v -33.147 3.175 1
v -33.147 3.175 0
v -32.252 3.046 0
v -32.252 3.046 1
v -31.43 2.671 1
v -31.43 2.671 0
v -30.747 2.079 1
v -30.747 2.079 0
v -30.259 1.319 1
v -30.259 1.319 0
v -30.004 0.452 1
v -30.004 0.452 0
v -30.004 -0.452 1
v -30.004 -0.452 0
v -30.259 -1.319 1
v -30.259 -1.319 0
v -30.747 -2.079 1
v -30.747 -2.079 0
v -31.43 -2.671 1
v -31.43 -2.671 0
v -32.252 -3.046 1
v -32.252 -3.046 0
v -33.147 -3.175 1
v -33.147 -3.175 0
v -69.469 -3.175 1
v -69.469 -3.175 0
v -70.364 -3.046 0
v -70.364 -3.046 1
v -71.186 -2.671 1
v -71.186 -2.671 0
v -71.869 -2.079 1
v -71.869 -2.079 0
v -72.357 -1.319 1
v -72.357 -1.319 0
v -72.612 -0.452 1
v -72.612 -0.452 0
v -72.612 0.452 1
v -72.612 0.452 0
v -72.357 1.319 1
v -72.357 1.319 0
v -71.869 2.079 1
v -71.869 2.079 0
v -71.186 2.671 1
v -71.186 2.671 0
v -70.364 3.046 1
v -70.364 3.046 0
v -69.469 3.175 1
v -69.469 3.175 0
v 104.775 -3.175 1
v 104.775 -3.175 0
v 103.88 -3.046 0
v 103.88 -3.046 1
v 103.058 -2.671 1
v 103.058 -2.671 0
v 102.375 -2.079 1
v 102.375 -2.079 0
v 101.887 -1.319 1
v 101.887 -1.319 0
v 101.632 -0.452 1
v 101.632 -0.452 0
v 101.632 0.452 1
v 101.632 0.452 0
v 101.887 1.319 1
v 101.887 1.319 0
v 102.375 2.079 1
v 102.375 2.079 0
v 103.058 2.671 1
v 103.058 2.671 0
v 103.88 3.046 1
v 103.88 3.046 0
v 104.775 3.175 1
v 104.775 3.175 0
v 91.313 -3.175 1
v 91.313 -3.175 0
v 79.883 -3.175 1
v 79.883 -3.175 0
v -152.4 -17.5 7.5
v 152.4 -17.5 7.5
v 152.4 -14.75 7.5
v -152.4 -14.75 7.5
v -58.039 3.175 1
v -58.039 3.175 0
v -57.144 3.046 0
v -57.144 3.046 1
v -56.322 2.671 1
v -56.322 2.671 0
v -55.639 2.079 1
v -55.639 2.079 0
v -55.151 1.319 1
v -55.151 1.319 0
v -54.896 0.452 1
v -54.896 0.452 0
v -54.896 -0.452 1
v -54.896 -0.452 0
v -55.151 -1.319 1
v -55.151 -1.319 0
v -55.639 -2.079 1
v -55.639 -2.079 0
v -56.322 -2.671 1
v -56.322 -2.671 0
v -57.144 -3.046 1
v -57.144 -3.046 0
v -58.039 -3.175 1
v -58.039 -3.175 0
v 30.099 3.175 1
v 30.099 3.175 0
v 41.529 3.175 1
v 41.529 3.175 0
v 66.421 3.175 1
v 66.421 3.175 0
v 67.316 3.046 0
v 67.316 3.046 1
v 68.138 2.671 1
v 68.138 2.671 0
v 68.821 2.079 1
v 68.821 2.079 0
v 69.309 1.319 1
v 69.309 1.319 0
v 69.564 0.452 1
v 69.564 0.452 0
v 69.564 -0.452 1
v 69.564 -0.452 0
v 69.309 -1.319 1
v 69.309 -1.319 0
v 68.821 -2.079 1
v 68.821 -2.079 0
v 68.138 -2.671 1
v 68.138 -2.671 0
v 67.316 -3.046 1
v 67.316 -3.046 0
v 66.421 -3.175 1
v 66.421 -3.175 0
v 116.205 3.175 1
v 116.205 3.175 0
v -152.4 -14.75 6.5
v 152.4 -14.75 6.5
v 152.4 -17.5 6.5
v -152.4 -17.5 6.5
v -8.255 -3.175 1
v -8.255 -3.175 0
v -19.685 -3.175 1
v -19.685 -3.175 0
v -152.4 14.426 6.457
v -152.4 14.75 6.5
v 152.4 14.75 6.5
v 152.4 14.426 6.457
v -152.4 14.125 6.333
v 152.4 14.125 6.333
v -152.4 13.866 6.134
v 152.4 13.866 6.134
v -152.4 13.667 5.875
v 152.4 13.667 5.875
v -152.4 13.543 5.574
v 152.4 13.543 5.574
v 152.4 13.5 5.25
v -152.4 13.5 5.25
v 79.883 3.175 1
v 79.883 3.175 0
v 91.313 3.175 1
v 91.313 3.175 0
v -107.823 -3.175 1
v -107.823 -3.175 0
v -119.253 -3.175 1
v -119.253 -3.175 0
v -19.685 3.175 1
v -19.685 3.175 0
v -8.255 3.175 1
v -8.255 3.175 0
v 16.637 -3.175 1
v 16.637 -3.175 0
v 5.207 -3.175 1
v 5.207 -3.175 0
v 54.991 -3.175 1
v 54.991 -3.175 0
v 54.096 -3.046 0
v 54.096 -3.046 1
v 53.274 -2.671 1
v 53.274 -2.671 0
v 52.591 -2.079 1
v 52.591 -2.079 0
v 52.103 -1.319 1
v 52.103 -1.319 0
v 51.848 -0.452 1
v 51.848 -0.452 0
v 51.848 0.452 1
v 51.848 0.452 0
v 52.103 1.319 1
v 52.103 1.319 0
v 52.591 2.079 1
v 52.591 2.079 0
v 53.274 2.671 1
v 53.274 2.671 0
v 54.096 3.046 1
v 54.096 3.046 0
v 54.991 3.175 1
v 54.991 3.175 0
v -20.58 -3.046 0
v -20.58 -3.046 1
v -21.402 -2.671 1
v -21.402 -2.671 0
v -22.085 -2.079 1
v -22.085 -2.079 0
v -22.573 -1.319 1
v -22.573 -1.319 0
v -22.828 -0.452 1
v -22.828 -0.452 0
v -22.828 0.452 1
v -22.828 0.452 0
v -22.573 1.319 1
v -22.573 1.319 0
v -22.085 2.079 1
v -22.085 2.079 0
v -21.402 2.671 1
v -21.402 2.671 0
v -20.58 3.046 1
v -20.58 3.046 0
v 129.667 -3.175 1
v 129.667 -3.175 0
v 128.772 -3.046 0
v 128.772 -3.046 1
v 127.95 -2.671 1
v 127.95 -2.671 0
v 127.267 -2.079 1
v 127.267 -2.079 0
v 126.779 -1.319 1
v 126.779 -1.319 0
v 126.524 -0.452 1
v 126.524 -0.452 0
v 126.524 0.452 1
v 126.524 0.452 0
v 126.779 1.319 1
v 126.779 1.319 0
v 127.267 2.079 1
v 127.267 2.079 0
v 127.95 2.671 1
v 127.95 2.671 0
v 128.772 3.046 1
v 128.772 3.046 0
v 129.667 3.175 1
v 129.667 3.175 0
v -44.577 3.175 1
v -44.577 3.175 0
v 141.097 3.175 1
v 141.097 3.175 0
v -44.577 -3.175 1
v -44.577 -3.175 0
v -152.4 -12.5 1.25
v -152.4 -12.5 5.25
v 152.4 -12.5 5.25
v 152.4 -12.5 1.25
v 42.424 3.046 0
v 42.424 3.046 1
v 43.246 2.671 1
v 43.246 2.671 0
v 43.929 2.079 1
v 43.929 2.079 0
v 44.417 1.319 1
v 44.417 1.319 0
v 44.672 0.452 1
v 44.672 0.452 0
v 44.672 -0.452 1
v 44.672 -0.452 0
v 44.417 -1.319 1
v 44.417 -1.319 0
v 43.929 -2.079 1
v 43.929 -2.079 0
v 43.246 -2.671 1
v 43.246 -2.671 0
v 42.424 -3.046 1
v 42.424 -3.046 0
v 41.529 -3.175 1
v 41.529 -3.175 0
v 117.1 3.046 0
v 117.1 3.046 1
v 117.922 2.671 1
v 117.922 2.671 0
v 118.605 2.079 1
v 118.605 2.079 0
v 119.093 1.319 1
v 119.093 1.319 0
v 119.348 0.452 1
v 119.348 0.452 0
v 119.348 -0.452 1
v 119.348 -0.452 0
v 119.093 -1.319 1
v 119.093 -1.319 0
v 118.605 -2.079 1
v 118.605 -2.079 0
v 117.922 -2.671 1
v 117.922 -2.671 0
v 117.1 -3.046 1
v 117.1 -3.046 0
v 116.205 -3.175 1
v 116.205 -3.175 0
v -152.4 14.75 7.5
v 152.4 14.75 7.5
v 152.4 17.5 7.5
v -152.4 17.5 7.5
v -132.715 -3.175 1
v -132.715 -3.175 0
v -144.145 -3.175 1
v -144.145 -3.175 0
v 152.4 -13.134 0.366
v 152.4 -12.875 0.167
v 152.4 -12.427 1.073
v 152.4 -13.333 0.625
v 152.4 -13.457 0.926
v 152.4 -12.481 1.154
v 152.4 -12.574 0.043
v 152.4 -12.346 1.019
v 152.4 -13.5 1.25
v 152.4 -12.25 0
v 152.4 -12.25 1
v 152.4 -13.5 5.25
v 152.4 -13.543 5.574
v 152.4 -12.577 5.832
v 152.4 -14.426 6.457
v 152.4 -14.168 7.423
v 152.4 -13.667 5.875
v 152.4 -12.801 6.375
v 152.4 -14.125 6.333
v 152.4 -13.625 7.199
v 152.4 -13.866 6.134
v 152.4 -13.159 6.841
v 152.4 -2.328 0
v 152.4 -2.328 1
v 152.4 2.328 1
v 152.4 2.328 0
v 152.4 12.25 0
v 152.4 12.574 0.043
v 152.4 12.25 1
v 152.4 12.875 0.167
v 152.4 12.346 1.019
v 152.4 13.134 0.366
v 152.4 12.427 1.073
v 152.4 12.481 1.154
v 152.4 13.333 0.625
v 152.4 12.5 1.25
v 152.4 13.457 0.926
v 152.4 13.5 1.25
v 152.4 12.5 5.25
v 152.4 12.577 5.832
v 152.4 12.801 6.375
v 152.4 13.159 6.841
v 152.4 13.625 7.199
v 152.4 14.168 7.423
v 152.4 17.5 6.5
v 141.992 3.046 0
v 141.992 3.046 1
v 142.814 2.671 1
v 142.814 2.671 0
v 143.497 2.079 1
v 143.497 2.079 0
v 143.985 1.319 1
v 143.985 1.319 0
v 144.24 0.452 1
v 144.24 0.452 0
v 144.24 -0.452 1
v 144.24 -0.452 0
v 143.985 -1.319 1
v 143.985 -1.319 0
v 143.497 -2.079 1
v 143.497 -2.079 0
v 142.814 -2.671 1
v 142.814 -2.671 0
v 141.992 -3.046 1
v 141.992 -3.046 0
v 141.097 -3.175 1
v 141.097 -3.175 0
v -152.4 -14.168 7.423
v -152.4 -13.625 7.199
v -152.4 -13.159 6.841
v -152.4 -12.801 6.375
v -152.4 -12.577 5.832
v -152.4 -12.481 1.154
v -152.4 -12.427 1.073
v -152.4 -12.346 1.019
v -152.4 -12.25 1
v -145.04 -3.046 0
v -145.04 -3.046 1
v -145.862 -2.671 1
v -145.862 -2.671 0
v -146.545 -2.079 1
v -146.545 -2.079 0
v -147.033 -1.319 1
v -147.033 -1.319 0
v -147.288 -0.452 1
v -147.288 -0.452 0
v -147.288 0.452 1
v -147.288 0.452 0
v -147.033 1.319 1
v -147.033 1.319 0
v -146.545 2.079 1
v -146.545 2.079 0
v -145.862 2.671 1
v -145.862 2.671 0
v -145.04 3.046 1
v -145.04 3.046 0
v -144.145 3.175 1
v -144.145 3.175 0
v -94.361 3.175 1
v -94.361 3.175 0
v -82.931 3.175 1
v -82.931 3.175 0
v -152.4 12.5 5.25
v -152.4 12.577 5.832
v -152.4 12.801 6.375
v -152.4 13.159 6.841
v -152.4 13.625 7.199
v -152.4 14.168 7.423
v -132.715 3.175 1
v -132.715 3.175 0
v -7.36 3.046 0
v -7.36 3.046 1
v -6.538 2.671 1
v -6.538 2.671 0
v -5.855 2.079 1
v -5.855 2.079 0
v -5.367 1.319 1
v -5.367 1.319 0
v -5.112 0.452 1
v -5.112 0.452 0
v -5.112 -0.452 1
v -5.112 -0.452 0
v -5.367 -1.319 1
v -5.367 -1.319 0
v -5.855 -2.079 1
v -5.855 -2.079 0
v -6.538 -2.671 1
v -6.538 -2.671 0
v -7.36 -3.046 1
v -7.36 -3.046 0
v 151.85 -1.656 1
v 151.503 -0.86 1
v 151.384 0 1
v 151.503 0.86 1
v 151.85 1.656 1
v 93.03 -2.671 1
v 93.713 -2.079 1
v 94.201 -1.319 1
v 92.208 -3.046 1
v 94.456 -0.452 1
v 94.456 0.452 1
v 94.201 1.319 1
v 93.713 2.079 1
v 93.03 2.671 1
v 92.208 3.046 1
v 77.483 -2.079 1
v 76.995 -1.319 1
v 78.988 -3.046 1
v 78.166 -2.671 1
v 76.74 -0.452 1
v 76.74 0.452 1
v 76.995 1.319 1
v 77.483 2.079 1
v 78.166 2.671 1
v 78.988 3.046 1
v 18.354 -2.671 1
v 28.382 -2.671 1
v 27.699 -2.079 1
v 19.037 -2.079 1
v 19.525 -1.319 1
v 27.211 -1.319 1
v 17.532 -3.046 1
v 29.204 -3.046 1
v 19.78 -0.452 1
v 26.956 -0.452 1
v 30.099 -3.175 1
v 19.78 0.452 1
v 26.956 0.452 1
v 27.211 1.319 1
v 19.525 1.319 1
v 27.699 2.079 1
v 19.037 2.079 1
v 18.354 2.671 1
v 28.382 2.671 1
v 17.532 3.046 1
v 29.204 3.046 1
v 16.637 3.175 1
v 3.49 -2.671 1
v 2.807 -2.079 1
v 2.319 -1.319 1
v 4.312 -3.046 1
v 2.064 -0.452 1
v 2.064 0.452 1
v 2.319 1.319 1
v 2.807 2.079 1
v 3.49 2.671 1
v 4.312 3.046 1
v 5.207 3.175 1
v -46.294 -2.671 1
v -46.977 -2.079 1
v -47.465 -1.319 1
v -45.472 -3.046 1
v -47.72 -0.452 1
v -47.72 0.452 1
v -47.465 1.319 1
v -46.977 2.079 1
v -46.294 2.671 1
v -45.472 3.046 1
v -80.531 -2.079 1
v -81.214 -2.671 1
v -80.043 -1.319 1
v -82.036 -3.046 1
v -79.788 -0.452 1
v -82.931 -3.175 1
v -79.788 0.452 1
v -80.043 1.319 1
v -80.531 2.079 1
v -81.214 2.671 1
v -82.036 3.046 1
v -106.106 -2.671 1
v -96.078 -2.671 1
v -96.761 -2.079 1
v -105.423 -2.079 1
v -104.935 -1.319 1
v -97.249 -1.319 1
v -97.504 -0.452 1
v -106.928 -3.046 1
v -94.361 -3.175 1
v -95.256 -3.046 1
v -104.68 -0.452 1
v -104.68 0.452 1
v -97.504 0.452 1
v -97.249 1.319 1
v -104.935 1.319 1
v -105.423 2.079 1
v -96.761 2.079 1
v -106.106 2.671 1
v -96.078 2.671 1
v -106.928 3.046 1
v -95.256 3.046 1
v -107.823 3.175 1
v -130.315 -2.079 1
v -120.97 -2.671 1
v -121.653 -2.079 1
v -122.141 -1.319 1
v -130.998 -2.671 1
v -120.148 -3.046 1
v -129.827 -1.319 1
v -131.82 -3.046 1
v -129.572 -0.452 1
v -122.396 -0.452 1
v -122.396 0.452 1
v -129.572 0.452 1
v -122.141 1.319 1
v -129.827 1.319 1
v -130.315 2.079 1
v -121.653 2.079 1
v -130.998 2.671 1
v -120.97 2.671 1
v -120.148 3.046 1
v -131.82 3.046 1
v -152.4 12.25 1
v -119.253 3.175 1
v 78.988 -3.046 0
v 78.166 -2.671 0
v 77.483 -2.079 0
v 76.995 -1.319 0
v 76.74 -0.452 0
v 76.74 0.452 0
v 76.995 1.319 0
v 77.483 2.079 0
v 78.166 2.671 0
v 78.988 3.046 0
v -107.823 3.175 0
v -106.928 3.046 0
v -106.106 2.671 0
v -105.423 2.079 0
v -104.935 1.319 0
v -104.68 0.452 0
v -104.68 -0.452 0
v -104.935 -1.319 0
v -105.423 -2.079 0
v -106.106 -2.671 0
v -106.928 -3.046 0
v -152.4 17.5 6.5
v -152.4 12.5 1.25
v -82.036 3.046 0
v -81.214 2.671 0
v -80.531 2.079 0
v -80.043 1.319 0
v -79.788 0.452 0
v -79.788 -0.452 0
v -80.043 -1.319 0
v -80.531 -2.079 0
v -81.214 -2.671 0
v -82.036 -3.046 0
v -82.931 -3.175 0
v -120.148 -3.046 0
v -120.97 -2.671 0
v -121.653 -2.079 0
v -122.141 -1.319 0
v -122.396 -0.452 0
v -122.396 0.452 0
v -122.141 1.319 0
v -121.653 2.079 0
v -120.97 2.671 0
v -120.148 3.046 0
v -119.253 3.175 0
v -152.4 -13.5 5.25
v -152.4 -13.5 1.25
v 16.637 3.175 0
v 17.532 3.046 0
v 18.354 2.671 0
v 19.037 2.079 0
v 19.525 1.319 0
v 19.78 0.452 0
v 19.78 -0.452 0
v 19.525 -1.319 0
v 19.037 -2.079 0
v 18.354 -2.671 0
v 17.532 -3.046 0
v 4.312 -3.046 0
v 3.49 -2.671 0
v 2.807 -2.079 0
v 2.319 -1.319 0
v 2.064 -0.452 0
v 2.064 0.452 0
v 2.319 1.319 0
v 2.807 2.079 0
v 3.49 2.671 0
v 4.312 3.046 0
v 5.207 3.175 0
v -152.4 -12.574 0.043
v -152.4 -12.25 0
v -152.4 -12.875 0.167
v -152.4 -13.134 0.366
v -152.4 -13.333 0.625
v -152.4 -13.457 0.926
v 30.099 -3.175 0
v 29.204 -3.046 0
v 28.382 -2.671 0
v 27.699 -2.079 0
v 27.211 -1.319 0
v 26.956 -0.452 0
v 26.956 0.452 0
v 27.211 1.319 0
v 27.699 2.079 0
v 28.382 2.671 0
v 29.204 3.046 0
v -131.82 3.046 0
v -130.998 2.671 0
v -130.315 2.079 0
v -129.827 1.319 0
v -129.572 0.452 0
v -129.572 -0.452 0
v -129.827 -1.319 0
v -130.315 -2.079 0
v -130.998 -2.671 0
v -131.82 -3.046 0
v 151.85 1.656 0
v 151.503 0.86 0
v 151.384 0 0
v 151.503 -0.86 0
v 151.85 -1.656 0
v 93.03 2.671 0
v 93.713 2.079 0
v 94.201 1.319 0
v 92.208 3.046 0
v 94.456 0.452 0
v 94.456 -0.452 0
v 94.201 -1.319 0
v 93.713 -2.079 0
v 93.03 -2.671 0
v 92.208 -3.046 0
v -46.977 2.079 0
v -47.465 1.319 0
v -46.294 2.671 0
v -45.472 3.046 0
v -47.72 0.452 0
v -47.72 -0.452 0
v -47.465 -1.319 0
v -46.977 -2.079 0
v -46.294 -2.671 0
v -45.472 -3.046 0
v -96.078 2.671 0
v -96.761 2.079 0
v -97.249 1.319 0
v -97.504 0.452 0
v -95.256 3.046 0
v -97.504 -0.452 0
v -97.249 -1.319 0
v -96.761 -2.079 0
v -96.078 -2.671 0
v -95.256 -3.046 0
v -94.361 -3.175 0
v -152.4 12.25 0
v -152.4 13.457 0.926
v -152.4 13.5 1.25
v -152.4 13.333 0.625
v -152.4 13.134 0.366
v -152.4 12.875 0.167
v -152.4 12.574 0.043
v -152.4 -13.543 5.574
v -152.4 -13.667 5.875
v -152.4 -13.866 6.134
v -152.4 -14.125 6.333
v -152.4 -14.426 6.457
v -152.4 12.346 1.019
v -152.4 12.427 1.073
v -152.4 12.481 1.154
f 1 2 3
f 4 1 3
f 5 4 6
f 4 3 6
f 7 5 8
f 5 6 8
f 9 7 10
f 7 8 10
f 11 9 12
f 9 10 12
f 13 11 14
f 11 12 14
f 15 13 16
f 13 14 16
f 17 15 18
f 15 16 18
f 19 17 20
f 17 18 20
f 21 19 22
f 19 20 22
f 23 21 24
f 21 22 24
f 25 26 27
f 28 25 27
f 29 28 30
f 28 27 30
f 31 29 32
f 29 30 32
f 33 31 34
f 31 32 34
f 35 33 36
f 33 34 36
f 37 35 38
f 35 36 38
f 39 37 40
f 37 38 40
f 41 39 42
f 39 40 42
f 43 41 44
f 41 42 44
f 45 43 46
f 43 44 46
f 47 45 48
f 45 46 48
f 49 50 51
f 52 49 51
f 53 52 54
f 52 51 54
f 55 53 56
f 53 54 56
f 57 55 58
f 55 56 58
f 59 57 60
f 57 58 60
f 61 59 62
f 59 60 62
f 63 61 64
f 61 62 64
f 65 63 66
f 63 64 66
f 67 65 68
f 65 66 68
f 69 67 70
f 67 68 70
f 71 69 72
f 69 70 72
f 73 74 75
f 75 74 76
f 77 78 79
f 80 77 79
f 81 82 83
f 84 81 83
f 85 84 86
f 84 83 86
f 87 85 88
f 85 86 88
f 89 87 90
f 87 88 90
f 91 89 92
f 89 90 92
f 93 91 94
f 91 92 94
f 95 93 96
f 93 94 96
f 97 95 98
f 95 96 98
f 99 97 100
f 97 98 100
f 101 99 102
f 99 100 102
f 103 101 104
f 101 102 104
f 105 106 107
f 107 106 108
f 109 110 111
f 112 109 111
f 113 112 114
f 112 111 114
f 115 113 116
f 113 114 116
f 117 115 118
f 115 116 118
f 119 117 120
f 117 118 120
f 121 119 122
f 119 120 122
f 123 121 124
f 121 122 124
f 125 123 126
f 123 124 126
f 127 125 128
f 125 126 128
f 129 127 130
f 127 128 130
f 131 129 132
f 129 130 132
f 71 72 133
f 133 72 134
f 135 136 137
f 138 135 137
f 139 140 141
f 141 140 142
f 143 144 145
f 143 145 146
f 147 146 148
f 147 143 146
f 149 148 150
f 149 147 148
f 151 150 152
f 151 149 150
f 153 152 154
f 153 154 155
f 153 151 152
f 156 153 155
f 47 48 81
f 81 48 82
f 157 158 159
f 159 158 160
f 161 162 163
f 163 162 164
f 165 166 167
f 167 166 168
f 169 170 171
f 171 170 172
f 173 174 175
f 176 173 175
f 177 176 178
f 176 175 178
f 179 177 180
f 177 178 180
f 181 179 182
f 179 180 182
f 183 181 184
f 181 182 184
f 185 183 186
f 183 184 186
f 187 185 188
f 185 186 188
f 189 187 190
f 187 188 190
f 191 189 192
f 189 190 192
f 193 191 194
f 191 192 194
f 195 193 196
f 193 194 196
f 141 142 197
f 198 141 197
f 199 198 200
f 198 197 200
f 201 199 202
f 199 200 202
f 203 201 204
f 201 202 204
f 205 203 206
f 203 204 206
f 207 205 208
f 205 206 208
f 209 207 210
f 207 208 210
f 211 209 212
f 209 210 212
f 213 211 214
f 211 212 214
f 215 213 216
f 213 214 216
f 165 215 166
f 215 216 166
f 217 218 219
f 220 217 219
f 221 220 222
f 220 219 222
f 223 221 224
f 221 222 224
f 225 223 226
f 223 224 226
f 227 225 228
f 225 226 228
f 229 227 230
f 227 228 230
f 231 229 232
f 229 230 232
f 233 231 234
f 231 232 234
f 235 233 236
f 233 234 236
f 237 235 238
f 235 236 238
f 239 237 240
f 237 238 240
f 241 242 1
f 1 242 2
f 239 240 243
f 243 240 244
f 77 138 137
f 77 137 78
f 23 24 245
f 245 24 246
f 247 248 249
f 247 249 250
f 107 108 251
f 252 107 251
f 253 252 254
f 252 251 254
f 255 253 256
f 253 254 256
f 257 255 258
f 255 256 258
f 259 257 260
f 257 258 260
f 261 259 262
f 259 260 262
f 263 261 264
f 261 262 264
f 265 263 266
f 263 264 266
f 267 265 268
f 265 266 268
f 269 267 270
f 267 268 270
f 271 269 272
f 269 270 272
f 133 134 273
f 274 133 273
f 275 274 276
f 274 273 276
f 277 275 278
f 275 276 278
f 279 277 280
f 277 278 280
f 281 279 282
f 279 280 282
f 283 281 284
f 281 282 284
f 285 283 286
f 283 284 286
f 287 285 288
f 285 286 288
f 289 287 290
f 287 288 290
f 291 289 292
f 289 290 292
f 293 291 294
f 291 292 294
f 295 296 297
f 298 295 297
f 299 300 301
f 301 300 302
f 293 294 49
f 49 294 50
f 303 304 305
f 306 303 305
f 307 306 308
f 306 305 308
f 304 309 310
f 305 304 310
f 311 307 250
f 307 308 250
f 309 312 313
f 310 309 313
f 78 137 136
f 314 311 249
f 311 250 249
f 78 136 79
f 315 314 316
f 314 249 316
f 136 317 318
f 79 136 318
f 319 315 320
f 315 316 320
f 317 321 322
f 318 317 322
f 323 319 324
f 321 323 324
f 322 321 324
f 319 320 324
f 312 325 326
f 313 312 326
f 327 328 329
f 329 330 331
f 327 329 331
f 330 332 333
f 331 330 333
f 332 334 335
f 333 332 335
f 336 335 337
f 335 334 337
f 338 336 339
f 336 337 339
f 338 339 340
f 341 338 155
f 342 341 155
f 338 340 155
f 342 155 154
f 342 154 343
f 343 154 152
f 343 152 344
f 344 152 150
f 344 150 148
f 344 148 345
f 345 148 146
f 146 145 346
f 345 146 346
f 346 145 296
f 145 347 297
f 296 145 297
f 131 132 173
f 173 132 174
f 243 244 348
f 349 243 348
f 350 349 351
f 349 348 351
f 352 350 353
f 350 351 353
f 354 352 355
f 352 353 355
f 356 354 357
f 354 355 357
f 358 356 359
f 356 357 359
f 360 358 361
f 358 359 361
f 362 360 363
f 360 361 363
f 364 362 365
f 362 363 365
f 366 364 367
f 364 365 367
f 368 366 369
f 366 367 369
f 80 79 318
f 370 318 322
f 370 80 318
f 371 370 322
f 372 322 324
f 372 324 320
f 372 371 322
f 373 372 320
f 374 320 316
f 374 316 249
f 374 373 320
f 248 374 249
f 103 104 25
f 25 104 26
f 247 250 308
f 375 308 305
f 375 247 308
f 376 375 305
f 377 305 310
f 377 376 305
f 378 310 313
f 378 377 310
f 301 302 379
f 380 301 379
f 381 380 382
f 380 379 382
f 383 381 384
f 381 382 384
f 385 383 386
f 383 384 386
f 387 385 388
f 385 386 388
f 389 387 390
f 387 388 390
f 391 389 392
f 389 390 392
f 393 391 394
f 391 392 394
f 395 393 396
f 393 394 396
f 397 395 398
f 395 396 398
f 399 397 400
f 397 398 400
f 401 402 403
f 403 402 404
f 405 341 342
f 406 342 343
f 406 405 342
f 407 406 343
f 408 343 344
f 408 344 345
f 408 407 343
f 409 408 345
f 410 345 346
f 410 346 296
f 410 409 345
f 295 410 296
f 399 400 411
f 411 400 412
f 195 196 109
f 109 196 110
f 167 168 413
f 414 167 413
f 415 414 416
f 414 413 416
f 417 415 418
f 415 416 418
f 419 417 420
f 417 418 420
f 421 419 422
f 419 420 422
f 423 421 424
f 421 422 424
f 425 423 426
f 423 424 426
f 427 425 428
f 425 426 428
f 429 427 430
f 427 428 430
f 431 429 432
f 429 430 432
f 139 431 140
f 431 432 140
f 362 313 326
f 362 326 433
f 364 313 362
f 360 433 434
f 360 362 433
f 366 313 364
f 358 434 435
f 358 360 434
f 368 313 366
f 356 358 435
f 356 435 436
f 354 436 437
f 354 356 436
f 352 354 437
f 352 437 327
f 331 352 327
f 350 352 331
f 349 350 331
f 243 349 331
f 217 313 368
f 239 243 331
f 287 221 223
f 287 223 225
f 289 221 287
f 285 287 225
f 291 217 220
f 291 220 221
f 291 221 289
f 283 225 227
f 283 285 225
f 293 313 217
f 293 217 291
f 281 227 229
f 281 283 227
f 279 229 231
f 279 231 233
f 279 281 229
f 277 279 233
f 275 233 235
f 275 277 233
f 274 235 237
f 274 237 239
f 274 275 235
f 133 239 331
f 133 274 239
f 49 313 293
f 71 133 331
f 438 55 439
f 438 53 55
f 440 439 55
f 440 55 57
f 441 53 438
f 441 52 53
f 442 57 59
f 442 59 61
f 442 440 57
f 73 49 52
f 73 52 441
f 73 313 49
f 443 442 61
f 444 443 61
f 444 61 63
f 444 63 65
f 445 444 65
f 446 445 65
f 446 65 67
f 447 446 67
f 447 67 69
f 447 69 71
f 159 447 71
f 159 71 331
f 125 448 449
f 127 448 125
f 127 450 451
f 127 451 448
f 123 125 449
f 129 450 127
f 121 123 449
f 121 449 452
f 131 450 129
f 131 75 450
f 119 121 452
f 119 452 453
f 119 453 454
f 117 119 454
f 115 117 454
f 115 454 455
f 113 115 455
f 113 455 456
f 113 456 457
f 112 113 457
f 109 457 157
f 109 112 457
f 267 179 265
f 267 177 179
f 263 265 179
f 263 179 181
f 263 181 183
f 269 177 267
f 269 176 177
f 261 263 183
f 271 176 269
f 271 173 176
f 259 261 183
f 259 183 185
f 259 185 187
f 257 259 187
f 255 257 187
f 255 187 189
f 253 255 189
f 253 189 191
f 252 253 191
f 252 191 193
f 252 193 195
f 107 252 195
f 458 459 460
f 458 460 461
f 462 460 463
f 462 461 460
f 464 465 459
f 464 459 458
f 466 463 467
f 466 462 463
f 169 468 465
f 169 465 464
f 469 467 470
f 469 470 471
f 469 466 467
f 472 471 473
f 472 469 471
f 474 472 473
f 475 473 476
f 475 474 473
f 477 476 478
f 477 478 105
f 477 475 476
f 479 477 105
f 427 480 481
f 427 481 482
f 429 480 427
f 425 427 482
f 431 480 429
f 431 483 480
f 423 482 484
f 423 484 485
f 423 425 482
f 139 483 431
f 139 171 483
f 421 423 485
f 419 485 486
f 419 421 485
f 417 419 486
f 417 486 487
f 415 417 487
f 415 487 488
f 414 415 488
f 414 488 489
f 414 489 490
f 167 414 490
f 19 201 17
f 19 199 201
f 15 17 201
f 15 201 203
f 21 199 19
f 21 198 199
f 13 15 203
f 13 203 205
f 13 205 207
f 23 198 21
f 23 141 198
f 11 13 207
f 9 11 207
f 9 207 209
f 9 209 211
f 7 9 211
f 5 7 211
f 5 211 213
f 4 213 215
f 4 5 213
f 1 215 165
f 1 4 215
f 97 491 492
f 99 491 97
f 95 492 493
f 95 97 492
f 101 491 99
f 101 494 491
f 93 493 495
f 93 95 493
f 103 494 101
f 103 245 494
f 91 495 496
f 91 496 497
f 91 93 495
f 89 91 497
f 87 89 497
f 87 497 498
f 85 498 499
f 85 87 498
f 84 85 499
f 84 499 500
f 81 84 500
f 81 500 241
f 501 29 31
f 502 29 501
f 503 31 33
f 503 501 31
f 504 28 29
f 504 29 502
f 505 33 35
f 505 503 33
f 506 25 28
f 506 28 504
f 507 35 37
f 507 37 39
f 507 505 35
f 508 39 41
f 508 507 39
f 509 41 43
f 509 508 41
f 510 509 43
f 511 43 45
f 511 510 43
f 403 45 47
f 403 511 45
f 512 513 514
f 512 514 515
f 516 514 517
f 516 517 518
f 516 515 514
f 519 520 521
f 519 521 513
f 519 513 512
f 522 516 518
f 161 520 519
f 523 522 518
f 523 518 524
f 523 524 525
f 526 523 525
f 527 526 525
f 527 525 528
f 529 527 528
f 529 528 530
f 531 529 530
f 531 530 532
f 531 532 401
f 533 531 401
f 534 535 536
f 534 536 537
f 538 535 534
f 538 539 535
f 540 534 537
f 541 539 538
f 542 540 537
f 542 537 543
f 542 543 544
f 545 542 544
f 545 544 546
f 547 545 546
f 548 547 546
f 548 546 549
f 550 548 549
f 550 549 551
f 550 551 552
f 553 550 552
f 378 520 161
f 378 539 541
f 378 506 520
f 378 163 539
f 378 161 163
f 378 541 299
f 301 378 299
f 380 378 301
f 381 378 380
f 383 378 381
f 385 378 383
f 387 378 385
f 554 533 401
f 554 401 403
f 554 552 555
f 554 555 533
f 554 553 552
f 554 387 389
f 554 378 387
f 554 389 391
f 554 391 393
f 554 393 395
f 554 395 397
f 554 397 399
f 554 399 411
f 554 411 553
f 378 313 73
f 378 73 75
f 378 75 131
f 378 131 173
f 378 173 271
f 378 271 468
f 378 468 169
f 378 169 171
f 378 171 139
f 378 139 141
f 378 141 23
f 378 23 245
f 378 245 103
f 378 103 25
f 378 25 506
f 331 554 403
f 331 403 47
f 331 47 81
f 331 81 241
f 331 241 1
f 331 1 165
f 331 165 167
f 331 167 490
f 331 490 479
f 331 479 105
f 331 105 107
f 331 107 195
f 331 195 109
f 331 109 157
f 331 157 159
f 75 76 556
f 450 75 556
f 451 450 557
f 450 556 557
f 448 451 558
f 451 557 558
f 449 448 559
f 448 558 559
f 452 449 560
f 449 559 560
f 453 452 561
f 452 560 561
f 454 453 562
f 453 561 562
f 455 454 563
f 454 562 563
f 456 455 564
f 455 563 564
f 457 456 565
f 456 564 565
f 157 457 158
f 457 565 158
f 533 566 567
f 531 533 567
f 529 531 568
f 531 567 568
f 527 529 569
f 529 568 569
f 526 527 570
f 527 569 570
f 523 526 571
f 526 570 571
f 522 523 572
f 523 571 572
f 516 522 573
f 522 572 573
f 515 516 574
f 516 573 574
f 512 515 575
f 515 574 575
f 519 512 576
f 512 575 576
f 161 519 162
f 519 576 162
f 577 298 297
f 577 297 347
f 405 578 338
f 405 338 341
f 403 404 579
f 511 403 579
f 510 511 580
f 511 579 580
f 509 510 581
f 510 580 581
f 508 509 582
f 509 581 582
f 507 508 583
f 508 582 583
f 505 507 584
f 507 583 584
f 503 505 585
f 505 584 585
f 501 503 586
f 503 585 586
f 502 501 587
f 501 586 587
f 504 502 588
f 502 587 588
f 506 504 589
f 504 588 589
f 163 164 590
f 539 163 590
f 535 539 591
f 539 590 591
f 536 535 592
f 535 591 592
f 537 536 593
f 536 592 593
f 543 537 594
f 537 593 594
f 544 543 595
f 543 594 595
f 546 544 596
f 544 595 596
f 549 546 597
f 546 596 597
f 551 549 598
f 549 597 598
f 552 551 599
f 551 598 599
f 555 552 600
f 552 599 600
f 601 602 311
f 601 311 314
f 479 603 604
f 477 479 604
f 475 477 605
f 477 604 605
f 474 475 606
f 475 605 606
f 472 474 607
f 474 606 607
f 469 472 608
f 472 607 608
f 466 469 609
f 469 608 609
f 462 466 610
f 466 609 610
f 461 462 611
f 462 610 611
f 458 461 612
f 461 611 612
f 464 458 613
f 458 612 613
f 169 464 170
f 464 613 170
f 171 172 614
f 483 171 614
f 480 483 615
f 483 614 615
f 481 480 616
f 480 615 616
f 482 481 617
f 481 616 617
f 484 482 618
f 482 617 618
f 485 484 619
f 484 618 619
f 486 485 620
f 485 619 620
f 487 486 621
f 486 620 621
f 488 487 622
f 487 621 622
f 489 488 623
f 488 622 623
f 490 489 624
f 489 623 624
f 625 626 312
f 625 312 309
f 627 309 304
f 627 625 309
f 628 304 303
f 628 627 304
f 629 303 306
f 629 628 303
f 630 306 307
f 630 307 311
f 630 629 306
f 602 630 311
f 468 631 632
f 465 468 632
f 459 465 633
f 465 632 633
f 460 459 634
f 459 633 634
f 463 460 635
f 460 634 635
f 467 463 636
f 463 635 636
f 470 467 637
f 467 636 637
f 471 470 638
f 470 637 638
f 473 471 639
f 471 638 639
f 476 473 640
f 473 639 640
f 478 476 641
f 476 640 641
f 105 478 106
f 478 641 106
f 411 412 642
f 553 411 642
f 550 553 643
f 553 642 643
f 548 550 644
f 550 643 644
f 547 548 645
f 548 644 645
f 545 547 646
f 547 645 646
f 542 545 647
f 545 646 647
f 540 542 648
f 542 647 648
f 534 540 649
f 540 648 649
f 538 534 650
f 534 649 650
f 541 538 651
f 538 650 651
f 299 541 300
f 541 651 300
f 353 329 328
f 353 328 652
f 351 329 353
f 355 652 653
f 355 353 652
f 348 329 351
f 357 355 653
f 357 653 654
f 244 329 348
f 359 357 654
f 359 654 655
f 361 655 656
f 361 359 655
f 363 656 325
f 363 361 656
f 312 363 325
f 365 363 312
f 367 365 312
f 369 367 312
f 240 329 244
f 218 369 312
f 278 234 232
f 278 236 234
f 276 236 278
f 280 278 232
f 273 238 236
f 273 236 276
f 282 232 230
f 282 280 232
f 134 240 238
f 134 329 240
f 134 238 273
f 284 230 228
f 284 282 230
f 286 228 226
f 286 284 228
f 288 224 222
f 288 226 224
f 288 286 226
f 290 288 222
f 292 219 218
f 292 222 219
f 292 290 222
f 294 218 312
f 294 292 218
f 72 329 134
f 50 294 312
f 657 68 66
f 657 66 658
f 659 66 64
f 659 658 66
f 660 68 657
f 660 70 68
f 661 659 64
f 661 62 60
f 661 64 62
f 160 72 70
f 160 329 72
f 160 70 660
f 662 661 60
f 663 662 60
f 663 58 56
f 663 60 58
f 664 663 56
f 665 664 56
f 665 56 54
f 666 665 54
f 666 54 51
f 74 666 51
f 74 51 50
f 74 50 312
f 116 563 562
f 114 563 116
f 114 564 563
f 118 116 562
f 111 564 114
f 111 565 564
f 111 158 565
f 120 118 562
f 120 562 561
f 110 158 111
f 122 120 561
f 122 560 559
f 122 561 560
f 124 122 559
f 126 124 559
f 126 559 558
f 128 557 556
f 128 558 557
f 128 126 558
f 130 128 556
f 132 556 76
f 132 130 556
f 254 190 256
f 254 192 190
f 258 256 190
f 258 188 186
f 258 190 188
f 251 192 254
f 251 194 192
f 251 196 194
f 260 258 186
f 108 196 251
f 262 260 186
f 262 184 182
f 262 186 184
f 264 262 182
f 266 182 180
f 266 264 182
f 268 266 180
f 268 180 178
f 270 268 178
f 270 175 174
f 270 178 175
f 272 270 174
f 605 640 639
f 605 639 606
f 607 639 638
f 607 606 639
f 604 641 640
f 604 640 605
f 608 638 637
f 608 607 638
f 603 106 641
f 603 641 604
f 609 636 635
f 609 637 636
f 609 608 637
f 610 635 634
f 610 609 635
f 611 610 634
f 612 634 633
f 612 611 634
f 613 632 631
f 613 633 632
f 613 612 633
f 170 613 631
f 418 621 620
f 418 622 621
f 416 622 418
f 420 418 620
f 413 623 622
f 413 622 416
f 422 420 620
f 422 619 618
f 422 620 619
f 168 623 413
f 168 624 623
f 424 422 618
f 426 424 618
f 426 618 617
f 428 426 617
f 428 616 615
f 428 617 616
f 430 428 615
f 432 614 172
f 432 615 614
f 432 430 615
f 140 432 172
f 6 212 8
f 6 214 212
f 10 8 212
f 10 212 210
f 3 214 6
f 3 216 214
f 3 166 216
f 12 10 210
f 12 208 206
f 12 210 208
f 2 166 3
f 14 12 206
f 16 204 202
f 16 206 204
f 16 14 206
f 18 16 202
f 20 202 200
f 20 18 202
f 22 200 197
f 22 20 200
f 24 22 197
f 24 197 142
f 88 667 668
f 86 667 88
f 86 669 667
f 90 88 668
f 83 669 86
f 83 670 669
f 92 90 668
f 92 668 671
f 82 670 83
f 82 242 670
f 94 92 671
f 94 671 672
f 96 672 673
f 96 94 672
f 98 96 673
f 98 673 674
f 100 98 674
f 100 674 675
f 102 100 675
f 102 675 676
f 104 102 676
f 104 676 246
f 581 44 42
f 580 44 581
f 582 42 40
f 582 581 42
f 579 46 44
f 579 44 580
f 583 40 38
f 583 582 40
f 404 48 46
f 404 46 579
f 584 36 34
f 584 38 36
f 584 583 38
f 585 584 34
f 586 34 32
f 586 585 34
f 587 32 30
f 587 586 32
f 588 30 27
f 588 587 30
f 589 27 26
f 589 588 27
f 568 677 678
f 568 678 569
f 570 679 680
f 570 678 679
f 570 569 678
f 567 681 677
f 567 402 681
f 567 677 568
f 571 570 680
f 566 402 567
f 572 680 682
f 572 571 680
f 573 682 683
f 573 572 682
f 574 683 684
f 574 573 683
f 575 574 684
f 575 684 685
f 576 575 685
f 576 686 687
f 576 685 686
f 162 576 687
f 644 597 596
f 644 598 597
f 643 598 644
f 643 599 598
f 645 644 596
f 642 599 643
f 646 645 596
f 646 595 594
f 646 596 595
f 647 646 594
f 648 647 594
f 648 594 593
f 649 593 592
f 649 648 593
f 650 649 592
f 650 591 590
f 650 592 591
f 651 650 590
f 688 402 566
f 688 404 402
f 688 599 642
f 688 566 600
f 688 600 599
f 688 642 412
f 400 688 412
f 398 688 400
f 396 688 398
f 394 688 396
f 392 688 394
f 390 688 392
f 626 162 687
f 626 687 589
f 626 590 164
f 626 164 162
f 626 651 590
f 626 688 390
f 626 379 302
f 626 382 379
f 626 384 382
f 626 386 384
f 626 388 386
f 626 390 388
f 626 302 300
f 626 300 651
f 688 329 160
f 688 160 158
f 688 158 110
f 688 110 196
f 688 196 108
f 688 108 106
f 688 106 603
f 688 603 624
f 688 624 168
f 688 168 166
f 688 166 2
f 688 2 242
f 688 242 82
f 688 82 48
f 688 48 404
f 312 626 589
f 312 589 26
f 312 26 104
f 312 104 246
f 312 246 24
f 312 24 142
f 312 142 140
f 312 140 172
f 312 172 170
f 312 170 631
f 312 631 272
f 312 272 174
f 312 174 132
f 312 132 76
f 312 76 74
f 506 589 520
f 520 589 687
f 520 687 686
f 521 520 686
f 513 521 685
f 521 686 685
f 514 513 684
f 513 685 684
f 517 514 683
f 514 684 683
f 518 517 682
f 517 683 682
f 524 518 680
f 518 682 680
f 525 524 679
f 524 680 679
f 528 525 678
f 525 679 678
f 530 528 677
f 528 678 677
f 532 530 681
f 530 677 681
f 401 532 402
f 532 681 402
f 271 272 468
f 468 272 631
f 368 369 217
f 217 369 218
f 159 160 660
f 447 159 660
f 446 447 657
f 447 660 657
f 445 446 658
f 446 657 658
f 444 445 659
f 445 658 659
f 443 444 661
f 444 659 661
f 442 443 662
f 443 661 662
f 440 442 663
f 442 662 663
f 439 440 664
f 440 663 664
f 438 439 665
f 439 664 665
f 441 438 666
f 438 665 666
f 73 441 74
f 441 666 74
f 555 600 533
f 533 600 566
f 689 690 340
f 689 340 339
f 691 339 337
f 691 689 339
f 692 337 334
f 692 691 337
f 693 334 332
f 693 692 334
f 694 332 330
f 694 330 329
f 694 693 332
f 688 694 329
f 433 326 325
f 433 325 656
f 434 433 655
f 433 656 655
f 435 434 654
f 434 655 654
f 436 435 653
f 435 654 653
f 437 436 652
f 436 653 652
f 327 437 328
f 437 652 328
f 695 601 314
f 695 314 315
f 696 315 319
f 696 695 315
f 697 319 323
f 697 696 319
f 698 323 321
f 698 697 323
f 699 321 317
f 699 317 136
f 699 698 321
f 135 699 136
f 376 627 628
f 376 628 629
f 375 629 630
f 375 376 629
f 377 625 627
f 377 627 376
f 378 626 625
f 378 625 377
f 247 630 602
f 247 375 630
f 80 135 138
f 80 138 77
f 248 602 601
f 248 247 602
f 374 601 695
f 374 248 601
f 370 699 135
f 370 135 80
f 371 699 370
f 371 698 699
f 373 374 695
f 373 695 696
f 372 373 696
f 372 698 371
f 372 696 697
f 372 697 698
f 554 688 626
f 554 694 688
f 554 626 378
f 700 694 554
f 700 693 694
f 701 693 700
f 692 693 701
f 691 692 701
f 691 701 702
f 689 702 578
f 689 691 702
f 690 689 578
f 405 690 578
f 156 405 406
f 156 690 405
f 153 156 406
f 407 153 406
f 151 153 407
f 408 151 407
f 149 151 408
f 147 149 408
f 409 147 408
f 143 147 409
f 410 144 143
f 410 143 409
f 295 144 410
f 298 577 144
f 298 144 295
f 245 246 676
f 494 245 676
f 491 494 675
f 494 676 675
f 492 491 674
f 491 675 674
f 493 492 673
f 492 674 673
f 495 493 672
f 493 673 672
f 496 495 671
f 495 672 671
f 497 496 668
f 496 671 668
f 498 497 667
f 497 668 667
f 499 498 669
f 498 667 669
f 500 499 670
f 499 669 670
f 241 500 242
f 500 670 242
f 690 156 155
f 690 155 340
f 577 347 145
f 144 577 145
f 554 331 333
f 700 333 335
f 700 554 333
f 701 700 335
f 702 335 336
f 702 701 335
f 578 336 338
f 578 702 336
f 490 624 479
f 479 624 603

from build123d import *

# Parameters (mm, degrees)
STRUCTURAL_MEMBER1_DEPTH = 304.8
CUT_EXTRUDE1_REACH       = 155.585
LPATTERN1_COUNT          = 13
LPATTERN1_PITCH          = 24.892


with BuildPart() as part:
    # Sketch2 → Structural Member1 (new body)
    with BuildSketch(Plane(origin=(-152.4, 0, 0), x_dir=(0, 0, -1), z_dir=(1, 0, 0))):
        with BuildLine():
            Line((0, 12.25), (0, -12.25))
            ThreePointArc((0, -12.25), (-0.366116524, -13.133883476), (-1.25, -13.5))
            Line((-1.25, -13.5), (-5.25, -13.5))
            ThreePointArc((-5.25, -13.5), (-6.133883476, -13.866116524), (-6.5, -14.75))
            Line((-6.5, -14.75), (-6.5, -17.5))
            Line((-6.5, -17.5), (-7.5, -17.5))
            Line((-7.5, -17.5), (-7.5, -14.75))
            ThreePointArc((-7.5, -14.75), (-6.840990258, -13.159009742), (-5.25, -12.5))
            Line((-5.25, -12.5), (-1.25, -12.5))
            ThreePointArc((-1.25, -12.5), (-1.073223305, -12.426776695), (-1, -12.25))
            Line((-1, -12.25), (-1, 12.25))
            ThreePointArc((-1, 12.25), (-1.073223305, 12.426776695), (-1.25, 12.5))
            Line((-1.25, 12.5), (-5.25, 12.5))
            ThreePointArc((-5.25, 12.5), (-6.840990258, 13.159009742), (-7.5, 14.75))
            Line((-7.5, 14.75), (-7.5, 17.5))
            Line((-7.5, 17.5), (-6.5, 17.5))
            Line((-6.5, 17.5), (-6.5, 14.75))
            ThreePointArc((-6.5, 14.75), (-6.133883476, 13.866116524), (-5.25, 13.5))
            Line((-5.25, 13.5), (-1.25, 13.5))
            ThreePointArc((-1.25, 13.5), (-0.366116524, 13.133883476), (0, 12.25))
        make_face()
    extrude(amount=STRUCTURAL_MEMBER1_DEPTH)

    # Sketch3 → Cut-Extrude1 (cut, up to next)
    with BuildSketch(Plane.XY, mode=Mode.PRIVATE) as cut_extrude1_sk1:
        with BuildLine():
            Line((-144.145, 3.175), (-132.715, 3.175))
            ThreePointArc((-132.715, 3.175), (-129.54, 0), (-132.715, -3.175))
            Line((-132.715, -3.175), (-144.145, -3.175))
            ThreePointArc((-144.145, -3.175), (-147.32, 0), (-144.145, 3.175))
        make_face()
    cut_extrude1_tool1 = extrude(cut_extrude1_sk1.sketch, amount=CUT_EXTRUDE1_REACH, mode=Mode.PRIVATE) & part.part
    cut_extrude1 = cut_extrude1_tool1.solids().sort_by_distance((-138.43, 0, 0))[0]
    add(cut_extrude1, mode=Mode.SUBTRACT)

    # LPattern1: Cut-Extrude1 ×13
    with Locations(*[(i * LPATTERN1_PITCH, 0, 0) for i in range(1, LPATTERN1_COUNT)]):
        add(cut_extrude1, mode=Mode.SUBTRACT)


solid = part.part
